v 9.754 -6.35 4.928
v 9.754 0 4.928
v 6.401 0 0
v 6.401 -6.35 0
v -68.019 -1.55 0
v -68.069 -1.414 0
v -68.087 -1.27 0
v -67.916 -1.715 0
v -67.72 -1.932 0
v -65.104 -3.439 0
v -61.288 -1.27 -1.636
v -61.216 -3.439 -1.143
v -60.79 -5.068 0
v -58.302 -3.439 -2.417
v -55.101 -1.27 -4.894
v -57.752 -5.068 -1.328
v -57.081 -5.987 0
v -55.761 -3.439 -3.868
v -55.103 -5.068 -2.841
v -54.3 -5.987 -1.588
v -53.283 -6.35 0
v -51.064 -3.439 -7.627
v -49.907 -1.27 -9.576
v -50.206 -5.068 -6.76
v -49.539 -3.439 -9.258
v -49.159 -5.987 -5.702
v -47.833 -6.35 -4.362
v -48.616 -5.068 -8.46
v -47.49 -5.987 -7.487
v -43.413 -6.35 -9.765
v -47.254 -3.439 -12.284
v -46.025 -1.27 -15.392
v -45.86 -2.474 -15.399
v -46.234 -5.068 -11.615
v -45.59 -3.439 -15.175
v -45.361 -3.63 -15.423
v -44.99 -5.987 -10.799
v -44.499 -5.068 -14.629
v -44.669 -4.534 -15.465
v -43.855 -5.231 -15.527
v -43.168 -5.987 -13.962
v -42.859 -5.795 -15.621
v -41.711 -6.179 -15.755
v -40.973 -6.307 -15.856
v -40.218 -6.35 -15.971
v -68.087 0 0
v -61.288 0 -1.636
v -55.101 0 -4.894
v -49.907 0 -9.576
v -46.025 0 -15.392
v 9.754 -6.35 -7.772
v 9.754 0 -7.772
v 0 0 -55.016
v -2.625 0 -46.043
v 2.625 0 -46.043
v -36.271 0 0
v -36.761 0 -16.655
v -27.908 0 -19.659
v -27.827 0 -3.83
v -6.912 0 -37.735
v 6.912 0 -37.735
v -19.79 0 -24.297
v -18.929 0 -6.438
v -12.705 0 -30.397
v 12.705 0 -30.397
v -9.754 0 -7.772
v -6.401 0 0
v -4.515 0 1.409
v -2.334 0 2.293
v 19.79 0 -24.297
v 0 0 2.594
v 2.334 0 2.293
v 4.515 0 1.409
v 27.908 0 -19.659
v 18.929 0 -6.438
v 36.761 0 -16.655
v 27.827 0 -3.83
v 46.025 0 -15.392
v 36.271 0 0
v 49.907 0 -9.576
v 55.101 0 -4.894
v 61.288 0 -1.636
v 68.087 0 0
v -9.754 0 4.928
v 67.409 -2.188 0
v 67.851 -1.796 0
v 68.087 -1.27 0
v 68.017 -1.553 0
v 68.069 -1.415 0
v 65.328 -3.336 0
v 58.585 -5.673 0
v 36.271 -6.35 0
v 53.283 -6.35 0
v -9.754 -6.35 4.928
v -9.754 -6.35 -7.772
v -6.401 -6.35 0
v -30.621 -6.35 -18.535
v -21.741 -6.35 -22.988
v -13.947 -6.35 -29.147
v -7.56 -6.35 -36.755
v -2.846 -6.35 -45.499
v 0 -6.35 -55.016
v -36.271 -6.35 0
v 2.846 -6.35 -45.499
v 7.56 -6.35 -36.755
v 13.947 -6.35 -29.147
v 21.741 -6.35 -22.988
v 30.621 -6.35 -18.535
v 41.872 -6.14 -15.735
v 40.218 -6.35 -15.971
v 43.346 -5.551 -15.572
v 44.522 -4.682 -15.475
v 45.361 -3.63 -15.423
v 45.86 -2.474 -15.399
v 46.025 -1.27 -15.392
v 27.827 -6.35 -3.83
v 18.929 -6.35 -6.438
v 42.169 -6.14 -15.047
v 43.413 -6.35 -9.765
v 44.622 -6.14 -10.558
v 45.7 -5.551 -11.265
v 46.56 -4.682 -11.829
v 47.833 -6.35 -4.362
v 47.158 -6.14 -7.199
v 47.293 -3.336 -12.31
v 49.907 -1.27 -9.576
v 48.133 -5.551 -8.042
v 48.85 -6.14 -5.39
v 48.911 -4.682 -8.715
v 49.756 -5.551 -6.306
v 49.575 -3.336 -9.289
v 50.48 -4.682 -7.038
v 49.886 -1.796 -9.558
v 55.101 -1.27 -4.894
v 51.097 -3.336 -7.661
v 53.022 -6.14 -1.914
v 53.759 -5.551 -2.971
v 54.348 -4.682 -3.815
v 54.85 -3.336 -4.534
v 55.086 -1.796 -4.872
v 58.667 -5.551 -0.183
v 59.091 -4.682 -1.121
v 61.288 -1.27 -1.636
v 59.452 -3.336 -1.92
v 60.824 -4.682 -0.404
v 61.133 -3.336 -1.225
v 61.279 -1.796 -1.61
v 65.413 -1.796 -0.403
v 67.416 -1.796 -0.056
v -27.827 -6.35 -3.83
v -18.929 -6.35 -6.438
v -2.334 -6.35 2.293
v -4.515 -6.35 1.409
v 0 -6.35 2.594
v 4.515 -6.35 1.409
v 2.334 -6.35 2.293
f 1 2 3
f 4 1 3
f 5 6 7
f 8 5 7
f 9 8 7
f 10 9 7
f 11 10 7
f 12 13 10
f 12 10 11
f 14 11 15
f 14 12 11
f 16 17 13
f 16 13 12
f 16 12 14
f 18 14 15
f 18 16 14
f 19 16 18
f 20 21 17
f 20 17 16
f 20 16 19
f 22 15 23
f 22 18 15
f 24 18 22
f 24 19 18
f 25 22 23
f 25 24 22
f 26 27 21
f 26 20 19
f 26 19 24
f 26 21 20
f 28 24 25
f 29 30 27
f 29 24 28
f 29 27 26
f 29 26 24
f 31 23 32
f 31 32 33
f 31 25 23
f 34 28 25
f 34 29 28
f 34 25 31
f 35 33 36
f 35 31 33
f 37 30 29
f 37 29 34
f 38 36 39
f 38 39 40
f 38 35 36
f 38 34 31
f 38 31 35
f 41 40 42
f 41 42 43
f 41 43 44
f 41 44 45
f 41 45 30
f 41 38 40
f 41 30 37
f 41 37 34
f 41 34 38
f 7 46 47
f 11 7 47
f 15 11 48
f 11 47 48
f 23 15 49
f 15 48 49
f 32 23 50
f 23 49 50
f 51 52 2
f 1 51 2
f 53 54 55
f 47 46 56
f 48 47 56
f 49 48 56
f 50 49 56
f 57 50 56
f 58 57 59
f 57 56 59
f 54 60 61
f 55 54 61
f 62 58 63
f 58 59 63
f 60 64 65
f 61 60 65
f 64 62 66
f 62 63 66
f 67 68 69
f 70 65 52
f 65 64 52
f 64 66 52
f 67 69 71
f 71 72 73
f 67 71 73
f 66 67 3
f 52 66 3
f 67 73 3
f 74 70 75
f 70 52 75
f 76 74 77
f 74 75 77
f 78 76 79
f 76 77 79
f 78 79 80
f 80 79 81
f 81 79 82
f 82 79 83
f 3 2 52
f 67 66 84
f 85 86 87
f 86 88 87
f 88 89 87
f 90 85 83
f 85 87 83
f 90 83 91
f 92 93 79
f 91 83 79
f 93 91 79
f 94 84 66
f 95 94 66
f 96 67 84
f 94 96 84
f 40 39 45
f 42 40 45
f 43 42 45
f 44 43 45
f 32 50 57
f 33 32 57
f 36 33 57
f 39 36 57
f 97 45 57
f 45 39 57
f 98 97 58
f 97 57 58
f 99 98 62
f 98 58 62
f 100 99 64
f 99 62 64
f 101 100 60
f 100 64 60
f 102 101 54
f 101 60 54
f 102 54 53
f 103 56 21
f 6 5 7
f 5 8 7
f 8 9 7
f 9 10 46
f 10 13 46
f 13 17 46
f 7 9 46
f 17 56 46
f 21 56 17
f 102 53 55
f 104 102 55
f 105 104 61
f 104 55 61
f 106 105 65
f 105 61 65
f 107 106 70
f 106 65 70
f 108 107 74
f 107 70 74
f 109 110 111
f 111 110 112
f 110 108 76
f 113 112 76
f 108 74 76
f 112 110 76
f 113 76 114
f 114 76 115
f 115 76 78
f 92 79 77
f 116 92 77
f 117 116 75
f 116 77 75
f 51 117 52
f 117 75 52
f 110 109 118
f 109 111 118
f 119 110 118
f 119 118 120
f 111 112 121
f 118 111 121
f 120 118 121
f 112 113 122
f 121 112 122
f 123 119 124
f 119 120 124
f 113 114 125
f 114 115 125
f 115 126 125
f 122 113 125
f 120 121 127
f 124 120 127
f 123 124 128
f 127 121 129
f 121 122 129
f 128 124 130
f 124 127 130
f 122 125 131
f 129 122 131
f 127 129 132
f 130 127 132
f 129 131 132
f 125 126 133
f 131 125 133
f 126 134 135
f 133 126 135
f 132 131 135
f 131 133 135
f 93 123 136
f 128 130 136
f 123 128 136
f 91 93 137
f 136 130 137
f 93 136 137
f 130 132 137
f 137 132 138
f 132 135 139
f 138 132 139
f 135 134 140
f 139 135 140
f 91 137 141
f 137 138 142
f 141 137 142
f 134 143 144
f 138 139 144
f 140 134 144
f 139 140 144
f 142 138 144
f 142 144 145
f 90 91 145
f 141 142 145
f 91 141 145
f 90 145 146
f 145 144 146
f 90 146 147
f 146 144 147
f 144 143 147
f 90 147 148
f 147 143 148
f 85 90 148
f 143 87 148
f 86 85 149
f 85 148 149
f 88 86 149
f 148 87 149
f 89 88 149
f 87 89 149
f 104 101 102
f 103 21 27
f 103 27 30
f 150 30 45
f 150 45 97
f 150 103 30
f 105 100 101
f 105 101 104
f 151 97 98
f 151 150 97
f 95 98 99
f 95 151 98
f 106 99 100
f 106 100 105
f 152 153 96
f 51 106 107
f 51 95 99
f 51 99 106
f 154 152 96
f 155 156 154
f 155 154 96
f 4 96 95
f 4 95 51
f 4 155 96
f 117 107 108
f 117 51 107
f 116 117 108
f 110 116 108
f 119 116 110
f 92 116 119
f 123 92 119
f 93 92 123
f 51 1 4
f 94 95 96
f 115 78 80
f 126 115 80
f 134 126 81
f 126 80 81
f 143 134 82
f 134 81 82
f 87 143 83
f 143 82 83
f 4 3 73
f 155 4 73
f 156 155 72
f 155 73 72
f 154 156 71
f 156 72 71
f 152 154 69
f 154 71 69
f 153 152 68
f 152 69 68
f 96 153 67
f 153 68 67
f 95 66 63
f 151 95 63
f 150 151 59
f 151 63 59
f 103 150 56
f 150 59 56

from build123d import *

# Parameters (mm, degrees)
F1_DEPTH = 6.35
F2_R     = 5.08
F3_R     = 5.08


with BuildPart() as f1:
    # F0 (on Front) → F1 (new body)
    with BuildSketch(Plane.XZ):
        with BuildLine():
            ThreePointArc((0, -55.016398), (16.101153, -27.176721), (46.024799, -15.3924))
            ThreePointArc((46.024799, -15.3924), (55.101189, -4.894395), (68.087099, 0))
            Line((68.087099, 0), (36.271196, 0))
            ThreePointArc((36.271196, 0), (23.424104, -5.290842), (9.753601, -7.772401))
            Line((9.753601, -7.772401), (9.753601, 4.927599))
            Line((9.753601, 4.927599), (6.4008, 0))
            ThreePointArc((6.4008, 0), (0, 2.593731), (-6.4008, 0))
            Line((-6.4008, 0), (-9.753601, 4.927599))
            Line((-9.753601, 4.927599), (-9.753601, -7.772401))
            ThreePointArc((-9.753601, -7.772401), (-23.424104, -5.290842), (-36.271196, 0))
            Line((-36.271196, 0), (-68.087099, 0))
            ThreePointArc((-68.087099, 0), (-55.101189, -4.894395), (-46.024799, -15.3924))
            ThreePointArc((-46.024799, -15.3924), (-16.101153, -27.176721), (0, -55.016398))
        make_face()
    extrude(amount=F1_DEPTH)

    # F2
    f2_edges = [f1.edges().sort_by_distance(p)[0] for p in [
        (-55.101189, -6.35, -4.894395),
    ]]
    fillet(f2_edges, radius=F2_R)

    # F3
    f3_edges = [f1.edges().sort_by_distance(p)[0] for p in [
        (55.101189, -6.35, -4.894395),
    ]]
    fillet(f3_edges, radius=F3_R)


solid = f1.part
